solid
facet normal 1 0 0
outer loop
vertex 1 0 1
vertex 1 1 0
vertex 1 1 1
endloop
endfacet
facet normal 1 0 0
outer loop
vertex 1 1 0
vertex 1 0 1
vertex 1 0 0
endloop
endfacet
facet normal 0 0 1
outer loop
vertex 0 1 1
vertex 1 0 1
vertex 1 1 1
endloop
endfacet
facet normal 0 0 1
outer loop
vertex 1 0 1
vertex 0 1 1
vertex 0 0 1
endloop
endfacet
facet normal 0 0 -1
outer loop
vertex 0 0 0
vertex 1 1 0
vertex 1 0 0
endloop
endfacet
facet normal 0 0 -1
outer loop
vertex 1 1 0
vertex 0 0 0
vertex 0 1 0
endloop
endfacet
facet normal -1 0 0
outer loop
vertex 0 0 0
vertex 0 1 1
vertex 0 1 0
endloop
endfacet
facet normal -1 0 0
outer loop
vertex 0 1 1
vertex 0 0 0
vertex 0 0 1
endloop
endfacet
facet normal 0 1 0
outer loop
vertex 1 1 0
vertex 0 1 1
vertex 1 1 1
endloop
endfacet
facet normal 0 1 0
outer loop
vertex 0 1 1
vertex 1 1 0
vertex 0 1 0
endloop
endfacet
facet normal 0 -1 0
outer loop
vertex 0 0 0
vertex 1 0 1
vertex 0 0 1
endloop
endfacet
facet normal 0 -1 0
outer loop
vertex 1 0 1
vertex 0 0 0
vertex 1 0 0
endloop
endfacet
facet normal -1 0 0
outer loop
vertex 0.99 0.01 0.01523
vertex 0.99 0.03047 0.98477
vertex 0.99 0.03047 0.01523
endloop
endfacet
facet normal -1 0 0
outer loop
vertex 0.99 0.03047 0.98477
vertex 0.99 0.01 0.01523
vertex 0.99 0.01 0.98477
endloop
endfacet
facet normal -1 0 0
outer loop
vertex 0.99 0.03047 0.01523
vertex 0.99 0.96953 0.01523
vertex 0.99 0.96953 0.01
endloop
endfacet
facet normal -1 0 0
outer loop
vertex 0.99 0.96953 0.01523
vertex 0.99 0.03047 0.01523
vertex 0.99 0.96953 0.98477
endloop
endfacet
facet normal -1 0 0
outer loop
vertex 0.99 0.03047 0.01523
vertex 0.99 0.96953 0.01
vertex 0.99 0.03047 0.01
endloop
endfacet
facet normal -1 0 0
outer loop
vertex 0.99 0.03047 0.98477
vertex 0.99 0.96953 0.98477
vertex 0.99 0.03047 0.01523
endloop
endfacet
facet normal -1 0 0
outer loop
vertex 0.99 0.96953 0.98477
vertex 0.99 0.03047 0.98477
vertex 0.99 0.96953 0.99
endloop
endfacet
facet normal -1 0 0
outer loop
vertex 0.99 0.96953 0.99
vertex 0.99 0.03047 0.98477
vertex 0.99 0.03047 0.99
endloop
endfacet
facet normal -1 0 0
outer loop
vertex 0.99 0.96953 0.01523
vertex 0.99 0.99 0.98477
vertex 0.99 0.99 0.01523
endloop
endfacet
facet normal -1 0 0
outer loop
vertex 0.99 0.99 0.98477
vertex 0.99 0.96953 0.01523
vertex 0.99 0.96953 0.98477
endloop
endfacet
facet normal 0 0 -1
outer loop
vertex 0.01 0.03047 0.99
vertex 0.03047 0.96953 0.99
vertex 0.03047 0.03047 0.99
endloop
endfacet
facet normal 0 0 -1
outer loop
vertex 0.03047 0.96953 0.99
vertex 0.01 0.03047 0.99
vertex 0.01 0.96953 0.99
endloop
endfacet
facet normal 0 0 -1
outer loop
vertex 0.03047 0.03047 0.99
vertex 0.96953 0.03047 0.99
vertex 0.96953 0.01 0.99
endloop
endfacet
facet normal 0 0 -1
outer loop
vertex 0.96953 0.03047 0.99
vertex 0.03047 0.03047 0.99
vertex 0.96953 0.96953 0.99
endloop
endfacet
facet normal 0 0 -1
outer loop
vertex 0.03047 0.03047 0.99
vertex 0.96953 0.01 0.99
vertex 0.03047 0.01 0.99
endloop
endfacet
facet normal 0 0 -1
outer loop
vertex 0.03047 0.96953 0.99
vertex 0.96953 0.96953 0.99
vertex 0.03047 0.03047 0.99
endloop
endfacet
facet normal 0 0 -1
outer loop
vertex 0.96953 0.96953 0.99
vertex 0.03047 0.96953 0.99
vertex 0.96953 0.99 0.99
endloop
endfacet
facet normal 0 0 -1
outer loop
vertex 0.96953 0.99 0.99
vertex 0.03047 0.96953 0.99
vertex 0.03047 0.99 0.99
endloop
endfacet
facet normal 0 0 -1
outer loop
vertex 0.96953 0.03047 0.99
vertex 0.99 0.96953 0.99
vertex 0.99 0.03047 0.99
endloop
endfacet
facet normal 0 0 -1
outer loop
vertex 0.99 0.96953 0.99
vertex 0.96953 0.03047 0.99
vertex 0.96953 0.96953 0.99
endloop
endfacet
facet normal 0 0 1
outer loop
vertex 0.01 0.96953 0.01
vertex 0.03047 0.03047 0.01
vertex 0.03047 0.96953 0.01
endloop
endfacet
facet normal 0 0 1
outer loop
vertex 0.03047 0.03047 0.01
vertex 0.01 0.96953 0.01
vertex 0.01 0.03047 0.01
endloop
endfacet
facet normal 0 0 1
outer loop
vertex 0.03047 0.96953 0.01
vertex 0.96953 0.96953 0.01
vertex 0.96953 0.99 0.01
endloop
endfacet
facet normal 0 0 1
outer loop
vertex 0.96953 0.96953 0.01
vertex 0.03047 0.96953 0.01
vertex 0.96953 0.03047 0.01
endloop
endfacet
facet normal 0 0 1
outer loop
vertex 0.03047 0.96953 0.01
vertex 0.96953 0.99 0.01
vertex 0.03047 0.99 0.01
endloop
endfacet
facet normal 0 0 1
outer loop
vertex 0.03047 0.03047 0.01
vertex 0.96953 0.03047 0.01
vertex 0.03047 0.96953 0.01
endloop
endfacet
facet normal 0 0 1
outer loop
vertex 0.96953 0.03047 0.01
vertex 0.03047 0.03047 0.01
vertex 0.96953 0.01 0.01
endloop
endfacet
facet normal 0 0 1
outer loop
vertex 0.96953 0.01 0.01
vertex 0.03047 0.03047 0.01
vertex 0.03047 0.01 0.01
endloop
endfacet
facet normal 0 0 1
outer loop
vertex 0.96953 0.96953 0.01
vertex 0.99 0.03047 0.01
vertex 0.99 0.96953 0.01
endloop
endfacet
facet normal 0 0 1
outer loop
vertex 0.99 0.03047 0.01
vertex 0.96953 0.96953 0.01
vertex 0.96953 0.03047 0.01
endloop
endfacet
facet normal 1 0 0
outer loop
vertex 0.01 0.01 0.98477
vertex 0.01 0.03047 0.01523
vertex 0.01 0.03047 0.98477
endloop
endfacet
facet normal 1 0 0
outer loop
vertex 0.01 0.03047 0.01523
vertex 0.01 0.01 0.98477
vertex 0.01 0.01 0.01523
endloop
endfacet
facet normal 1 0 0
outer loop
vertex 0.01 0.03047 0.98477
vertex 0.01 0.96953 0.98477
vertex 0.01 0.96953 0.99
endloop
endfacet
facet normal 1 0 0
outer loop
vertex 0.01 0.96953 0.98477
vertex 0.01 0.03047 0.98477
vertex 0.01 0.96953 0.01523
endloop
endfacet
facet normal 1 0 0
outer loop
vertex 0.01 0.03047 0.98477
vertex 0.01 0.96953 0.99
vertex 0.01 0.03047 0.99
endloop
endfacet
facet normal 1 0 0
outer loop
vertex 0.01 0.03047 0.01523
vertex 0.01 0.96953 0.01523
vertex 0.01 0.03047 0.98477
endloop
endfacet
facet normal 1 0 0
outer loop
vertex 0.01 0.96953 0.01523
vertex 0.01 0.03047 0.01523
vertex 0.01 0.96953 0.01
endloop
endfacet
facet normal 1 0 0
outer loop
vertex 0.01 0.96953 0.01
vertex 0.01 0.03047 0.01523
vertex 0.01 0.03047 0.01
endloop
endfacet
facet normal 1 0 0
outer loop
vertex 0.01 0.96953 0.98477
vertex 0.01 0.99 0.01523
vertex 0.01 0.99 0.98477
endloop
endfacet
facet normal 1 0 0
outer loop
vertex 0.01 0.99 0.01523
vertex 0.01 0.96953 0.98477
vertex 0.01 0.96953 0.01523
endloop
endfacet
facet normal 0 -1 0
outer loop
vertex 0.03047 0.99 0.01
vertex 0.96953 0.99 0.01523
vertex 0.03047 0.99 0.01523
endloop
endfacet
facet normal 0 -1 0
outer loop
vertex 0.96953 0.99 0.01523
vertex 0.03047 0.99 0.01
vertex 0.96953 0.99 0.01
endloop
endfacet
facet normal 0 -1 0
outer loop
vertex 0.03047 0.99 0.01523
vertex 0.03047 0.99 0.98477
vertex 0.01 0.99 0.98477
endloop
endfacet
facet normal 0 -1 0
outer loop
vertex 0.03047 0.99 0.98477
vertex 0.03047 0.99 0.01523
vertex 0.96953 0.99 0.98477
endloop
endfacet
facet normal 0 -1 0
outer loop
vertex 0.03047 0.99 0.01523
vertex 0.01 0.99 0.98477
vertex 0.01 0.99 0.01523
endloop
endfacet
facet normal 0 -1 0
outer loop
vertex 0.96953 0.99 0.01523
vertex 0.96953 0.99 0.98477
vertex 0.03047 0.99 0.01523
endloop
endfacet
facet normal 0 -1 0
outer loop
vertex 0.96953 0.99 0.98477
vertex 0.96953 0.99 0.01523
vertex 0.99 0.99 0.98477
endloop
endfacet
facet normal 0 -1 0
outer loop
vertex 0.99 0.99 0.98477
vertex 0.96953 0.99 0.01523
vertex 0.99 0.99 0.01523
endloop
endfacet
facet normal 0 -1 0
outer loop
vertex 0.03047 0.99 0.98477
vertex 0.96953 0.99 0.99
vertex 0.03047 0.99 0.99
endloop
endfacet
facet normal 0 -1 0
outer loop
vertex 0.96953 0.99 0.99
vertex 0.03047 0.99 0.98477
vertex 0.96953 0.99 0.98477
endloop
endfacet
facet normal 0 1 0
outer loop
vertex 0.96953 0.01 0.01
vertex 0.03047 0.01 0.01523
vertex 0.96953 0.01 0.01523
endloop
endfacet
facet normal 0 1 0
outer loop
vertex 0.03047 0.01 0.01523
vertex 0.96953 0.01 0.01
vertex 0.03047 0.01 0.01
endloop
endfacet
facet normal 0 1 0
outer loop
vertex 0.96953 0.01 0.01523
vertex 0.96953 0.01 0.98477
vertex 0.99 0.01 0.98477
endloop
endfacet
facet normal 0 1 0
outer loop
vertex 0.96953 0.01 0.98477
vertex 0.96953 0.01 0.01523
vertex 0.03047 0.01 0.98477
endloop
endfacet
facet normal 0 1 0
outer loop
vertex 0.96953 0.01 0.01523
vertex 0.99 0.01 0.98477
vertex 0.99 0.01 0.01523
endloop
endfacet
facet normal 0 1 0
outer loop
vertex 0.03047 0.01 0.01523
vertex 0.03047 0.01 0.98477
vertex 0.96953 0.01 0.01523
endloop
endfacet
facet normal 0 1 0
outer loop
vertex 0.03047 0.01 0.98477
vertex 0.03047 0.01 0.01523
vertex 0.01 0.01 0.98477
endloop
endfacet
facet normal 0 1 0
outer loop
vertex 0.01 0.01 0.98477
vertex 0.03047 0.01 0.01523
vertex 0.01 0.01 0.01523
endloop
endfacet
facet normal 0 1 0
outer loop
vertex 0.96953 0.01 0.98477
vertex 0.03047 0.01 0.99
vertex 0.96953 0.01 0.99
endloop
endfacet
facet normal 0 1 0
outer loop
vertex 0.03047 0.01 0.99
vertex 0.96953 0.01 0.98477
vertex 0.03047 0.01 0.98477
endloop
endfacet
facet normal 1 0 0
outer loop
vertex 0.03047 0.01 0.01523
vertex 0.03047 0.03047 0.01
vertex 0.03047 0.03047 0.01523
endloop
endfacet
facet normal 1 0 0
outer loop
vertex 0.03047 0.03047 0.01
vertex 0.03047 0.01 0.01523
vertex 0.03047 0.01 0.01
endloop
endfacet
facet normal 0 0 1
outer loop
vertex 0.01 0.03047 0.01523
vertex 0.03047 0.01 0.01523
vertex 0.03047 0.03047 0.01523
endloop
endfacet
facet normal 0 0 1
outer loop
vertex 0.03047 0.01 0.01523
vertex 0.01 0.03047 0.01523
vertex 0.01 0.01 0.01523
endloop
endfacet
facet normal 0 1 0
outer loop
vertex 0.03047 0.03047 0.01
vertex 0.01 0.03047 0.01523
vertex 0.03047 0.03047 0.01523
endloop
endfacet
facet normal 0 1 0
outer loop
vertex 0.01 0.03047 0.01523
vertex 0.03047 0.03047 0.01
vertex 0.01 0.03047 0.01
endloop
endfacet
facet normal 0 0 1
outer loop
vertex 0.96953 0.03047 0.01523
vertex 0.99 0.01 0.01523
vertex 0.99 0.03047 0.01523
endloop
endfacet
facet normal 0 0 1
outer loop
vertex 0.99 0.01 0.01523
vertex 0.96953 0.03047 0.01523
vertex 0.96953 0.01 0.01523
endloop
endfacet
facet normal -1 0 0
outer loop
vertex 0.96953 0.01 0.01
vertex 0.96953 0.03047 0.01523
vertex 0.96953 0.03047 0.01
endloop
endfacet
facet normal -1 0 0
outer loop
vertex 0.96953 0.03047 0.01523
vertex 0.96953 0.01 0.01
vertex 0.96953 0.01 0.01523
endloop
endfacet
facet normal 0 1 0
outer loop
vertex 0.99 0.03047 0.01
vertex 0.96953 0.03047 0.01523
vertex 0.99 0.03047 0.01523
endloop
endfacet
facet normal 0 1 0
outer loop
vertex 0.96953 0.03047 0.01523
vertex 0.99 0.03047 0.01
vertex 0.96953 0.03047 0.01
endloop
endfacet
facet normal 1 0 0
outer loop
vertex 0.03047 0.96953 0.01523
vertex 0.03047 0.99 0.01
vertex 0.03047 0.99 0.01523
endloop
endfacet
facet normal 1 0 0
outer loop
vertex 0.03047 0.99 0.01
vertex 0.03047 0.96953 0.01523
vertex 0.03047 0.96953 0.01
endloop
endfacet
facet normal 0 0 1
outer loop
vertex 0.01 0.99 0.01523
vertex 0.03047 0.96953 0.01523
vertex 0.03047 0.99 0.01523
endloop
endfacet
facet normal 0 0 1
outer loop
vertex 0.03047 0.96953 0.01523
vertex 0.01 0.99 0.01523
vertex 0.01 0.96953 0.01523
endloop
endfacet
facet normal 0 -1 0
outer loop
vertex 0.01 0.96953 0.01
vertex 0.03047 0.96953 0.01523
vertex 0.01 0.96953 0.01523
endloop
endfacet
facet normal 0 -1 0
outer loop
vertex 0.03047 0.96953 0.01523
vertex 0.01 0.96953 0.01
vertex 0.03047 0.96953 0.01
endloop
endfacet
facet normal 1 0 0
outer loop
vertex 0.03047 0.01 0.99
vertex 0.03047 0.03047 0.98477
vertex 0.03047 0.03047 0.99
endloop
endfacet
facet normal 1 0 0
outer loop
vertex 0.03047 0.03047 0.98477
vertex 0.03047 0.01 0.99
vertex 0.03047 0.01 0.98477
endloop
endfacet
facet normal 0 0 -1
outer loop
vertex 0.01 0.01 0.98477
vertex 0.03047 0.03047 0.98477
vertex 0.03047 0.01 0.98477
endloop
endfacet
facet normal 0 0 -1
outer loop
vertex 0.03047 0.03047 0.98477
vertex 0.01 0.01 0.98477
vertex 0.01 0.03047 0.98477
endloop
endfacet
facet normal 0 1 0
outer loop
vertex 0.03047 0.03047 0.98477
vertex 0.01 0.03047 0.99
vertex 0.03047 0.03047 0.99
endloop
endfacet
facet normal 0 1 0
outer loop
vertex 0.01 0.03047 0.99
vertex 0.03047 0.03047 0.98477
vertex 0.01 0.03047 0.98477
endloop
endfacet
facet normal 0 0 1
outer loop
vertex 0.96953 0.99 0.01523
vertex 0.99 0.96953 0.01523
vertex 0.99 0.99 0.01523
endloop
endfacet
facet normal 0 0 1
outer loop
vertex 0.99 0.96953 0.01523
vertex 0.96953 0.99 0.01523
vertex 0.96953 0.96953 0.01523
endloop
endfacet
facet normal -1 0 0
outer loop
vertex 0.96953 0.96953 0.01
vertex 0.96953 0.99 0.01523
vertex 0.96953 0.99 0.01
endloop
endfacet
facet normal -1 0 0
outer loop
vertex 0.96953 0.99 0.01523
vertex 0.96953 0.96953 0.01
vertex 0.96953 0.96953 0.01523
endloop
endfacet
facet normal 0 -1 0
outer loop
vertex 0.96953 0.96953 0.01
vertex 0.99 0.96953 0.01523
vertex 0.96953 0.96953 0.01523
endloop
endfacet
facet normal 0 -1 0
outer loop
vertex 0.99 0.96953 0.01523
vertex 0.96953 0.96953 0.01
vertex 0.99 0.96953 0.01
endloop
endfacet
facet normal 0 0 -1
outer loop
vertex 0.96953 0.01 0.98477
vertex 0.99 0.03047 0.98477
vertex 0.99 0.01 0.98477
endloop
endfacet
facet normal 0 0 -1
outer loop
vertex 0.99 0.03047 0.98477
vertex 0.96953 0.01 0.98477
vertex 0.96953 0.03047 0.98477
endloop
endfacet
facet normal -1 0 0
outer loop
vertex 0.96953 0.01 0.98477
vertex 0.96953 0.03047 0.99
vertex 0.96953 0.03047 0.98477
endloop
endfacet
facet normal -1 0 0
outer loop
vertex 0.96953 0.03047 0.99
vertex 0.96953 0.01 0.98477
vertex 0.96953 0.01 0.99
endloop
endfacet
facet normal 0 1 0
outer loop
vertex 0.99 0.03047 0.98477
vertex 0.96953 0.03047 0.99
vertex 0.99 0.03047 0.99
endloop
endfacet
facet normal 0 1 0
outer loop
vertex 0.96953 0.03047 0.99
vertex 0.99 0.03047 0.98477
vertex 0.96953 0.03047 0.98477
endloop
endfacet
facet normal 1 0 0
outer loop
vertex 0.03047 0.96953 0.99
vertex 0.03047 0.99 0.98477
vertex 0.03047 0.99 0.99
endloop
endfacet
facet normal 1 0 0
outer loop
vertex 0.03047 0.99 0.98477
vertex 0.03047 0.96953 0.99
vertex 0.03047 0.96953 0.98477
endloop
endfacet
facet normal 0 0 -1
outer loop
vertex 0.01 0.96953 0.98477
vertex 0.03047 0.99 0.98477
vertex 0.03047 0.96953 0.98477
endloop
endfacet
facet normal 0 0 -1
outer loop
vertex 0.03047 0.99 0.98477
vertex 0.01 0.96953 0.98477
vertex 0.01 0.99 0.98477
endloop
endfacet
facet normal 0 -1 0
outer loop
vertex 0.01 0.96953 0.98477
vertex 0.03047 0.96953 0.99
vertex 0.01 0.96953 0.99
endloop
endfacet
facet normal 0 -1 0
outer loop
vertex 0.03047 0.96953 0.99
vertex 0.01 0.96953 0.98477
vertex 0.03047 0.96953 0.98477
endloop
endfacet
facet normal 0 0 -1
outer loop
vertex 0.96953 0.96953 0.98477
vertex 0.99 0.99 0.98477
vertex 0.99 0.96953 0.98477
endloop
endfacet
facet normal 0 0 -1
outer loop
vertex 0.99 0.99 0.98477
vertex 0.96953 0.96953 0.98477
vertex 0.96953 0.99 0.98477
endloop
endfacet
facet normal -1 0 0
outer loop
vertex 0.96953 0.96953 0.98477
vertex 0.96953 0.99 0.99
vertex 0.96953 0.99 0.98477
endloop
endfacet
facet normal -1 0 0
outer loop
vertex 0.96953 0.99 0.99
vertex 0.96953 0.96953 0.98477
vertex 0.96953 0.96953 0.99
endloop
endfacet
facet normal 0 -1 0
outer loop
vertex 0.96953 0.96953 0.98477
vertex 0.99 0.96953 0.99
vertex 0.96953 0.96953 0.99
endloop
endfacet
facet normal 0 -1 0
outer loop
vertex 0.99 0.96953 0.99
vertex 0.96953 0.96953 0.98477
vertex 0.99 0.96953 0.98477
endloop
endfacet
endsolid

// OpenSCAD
translate([0.015625, 0.015625, 0.0078125]) color([0.8963847945892117, 0.17768527860810712, 0.7421299433927584]) cube([0.0296875, 0.0296875, 0.01484375], center=true);
translate([0.984375, 0.015625, 0.0078125]) color([0.5726441032141332, 0.7010906565364345, 2.8054897536655687e-05]) cube([0.0296875, 0.0296875, 0.01484375], center=true);
translate([0.015625, 0.984375, 0.0078125]) color([0.9927151128849199, 0.5738875881200397, 0.8693414592253195]) cube([0.0296875, 0.0296875, 0.01484375], center=true);
translate([0.015625, 0.015625, 0.9921875]) color([0.1879433986893274, 0.8080743352120339, 0.7348689117343706]) cube([0.0296875, 0.0296875, 0.01484375], center=true);
translate([0.984375, 0.984375, 0.0078125]) color([0.7771443311946873, 0.8187058499328415, 0.8365967518242569]) cube([0.0296875, 0.0296875, 0.01484375], center=true);
translate([0.984375, 0.015625, 0.9921875]) color([0.06142612673944736, 0.012155815124797242, 0.17105860394151118]) cube([0.0296875, 0.0296875, 0.01484375], center=true);
translate([0.015625, 0.984375, 0.9921875]) color([0.40881469891267075, 0.7784186392027261, 0.48412143043336353]) cube([0.0296875, 0.0296875, 0.01484375], center=true);
translate([0.984375, 0.984375, 0.9921875]) color([0.5999385703938157, 0.3872103803868594, 0.8857238548019783]) cube([0.0296875, 0.0296875, 0.01484375], center=true);
color([0.3,0.3,0.3,0.3]) difference() { cube([1,1,1]); translate([0.01,0.01,0.01]) cube([0.98,0.98,0.98]); }
